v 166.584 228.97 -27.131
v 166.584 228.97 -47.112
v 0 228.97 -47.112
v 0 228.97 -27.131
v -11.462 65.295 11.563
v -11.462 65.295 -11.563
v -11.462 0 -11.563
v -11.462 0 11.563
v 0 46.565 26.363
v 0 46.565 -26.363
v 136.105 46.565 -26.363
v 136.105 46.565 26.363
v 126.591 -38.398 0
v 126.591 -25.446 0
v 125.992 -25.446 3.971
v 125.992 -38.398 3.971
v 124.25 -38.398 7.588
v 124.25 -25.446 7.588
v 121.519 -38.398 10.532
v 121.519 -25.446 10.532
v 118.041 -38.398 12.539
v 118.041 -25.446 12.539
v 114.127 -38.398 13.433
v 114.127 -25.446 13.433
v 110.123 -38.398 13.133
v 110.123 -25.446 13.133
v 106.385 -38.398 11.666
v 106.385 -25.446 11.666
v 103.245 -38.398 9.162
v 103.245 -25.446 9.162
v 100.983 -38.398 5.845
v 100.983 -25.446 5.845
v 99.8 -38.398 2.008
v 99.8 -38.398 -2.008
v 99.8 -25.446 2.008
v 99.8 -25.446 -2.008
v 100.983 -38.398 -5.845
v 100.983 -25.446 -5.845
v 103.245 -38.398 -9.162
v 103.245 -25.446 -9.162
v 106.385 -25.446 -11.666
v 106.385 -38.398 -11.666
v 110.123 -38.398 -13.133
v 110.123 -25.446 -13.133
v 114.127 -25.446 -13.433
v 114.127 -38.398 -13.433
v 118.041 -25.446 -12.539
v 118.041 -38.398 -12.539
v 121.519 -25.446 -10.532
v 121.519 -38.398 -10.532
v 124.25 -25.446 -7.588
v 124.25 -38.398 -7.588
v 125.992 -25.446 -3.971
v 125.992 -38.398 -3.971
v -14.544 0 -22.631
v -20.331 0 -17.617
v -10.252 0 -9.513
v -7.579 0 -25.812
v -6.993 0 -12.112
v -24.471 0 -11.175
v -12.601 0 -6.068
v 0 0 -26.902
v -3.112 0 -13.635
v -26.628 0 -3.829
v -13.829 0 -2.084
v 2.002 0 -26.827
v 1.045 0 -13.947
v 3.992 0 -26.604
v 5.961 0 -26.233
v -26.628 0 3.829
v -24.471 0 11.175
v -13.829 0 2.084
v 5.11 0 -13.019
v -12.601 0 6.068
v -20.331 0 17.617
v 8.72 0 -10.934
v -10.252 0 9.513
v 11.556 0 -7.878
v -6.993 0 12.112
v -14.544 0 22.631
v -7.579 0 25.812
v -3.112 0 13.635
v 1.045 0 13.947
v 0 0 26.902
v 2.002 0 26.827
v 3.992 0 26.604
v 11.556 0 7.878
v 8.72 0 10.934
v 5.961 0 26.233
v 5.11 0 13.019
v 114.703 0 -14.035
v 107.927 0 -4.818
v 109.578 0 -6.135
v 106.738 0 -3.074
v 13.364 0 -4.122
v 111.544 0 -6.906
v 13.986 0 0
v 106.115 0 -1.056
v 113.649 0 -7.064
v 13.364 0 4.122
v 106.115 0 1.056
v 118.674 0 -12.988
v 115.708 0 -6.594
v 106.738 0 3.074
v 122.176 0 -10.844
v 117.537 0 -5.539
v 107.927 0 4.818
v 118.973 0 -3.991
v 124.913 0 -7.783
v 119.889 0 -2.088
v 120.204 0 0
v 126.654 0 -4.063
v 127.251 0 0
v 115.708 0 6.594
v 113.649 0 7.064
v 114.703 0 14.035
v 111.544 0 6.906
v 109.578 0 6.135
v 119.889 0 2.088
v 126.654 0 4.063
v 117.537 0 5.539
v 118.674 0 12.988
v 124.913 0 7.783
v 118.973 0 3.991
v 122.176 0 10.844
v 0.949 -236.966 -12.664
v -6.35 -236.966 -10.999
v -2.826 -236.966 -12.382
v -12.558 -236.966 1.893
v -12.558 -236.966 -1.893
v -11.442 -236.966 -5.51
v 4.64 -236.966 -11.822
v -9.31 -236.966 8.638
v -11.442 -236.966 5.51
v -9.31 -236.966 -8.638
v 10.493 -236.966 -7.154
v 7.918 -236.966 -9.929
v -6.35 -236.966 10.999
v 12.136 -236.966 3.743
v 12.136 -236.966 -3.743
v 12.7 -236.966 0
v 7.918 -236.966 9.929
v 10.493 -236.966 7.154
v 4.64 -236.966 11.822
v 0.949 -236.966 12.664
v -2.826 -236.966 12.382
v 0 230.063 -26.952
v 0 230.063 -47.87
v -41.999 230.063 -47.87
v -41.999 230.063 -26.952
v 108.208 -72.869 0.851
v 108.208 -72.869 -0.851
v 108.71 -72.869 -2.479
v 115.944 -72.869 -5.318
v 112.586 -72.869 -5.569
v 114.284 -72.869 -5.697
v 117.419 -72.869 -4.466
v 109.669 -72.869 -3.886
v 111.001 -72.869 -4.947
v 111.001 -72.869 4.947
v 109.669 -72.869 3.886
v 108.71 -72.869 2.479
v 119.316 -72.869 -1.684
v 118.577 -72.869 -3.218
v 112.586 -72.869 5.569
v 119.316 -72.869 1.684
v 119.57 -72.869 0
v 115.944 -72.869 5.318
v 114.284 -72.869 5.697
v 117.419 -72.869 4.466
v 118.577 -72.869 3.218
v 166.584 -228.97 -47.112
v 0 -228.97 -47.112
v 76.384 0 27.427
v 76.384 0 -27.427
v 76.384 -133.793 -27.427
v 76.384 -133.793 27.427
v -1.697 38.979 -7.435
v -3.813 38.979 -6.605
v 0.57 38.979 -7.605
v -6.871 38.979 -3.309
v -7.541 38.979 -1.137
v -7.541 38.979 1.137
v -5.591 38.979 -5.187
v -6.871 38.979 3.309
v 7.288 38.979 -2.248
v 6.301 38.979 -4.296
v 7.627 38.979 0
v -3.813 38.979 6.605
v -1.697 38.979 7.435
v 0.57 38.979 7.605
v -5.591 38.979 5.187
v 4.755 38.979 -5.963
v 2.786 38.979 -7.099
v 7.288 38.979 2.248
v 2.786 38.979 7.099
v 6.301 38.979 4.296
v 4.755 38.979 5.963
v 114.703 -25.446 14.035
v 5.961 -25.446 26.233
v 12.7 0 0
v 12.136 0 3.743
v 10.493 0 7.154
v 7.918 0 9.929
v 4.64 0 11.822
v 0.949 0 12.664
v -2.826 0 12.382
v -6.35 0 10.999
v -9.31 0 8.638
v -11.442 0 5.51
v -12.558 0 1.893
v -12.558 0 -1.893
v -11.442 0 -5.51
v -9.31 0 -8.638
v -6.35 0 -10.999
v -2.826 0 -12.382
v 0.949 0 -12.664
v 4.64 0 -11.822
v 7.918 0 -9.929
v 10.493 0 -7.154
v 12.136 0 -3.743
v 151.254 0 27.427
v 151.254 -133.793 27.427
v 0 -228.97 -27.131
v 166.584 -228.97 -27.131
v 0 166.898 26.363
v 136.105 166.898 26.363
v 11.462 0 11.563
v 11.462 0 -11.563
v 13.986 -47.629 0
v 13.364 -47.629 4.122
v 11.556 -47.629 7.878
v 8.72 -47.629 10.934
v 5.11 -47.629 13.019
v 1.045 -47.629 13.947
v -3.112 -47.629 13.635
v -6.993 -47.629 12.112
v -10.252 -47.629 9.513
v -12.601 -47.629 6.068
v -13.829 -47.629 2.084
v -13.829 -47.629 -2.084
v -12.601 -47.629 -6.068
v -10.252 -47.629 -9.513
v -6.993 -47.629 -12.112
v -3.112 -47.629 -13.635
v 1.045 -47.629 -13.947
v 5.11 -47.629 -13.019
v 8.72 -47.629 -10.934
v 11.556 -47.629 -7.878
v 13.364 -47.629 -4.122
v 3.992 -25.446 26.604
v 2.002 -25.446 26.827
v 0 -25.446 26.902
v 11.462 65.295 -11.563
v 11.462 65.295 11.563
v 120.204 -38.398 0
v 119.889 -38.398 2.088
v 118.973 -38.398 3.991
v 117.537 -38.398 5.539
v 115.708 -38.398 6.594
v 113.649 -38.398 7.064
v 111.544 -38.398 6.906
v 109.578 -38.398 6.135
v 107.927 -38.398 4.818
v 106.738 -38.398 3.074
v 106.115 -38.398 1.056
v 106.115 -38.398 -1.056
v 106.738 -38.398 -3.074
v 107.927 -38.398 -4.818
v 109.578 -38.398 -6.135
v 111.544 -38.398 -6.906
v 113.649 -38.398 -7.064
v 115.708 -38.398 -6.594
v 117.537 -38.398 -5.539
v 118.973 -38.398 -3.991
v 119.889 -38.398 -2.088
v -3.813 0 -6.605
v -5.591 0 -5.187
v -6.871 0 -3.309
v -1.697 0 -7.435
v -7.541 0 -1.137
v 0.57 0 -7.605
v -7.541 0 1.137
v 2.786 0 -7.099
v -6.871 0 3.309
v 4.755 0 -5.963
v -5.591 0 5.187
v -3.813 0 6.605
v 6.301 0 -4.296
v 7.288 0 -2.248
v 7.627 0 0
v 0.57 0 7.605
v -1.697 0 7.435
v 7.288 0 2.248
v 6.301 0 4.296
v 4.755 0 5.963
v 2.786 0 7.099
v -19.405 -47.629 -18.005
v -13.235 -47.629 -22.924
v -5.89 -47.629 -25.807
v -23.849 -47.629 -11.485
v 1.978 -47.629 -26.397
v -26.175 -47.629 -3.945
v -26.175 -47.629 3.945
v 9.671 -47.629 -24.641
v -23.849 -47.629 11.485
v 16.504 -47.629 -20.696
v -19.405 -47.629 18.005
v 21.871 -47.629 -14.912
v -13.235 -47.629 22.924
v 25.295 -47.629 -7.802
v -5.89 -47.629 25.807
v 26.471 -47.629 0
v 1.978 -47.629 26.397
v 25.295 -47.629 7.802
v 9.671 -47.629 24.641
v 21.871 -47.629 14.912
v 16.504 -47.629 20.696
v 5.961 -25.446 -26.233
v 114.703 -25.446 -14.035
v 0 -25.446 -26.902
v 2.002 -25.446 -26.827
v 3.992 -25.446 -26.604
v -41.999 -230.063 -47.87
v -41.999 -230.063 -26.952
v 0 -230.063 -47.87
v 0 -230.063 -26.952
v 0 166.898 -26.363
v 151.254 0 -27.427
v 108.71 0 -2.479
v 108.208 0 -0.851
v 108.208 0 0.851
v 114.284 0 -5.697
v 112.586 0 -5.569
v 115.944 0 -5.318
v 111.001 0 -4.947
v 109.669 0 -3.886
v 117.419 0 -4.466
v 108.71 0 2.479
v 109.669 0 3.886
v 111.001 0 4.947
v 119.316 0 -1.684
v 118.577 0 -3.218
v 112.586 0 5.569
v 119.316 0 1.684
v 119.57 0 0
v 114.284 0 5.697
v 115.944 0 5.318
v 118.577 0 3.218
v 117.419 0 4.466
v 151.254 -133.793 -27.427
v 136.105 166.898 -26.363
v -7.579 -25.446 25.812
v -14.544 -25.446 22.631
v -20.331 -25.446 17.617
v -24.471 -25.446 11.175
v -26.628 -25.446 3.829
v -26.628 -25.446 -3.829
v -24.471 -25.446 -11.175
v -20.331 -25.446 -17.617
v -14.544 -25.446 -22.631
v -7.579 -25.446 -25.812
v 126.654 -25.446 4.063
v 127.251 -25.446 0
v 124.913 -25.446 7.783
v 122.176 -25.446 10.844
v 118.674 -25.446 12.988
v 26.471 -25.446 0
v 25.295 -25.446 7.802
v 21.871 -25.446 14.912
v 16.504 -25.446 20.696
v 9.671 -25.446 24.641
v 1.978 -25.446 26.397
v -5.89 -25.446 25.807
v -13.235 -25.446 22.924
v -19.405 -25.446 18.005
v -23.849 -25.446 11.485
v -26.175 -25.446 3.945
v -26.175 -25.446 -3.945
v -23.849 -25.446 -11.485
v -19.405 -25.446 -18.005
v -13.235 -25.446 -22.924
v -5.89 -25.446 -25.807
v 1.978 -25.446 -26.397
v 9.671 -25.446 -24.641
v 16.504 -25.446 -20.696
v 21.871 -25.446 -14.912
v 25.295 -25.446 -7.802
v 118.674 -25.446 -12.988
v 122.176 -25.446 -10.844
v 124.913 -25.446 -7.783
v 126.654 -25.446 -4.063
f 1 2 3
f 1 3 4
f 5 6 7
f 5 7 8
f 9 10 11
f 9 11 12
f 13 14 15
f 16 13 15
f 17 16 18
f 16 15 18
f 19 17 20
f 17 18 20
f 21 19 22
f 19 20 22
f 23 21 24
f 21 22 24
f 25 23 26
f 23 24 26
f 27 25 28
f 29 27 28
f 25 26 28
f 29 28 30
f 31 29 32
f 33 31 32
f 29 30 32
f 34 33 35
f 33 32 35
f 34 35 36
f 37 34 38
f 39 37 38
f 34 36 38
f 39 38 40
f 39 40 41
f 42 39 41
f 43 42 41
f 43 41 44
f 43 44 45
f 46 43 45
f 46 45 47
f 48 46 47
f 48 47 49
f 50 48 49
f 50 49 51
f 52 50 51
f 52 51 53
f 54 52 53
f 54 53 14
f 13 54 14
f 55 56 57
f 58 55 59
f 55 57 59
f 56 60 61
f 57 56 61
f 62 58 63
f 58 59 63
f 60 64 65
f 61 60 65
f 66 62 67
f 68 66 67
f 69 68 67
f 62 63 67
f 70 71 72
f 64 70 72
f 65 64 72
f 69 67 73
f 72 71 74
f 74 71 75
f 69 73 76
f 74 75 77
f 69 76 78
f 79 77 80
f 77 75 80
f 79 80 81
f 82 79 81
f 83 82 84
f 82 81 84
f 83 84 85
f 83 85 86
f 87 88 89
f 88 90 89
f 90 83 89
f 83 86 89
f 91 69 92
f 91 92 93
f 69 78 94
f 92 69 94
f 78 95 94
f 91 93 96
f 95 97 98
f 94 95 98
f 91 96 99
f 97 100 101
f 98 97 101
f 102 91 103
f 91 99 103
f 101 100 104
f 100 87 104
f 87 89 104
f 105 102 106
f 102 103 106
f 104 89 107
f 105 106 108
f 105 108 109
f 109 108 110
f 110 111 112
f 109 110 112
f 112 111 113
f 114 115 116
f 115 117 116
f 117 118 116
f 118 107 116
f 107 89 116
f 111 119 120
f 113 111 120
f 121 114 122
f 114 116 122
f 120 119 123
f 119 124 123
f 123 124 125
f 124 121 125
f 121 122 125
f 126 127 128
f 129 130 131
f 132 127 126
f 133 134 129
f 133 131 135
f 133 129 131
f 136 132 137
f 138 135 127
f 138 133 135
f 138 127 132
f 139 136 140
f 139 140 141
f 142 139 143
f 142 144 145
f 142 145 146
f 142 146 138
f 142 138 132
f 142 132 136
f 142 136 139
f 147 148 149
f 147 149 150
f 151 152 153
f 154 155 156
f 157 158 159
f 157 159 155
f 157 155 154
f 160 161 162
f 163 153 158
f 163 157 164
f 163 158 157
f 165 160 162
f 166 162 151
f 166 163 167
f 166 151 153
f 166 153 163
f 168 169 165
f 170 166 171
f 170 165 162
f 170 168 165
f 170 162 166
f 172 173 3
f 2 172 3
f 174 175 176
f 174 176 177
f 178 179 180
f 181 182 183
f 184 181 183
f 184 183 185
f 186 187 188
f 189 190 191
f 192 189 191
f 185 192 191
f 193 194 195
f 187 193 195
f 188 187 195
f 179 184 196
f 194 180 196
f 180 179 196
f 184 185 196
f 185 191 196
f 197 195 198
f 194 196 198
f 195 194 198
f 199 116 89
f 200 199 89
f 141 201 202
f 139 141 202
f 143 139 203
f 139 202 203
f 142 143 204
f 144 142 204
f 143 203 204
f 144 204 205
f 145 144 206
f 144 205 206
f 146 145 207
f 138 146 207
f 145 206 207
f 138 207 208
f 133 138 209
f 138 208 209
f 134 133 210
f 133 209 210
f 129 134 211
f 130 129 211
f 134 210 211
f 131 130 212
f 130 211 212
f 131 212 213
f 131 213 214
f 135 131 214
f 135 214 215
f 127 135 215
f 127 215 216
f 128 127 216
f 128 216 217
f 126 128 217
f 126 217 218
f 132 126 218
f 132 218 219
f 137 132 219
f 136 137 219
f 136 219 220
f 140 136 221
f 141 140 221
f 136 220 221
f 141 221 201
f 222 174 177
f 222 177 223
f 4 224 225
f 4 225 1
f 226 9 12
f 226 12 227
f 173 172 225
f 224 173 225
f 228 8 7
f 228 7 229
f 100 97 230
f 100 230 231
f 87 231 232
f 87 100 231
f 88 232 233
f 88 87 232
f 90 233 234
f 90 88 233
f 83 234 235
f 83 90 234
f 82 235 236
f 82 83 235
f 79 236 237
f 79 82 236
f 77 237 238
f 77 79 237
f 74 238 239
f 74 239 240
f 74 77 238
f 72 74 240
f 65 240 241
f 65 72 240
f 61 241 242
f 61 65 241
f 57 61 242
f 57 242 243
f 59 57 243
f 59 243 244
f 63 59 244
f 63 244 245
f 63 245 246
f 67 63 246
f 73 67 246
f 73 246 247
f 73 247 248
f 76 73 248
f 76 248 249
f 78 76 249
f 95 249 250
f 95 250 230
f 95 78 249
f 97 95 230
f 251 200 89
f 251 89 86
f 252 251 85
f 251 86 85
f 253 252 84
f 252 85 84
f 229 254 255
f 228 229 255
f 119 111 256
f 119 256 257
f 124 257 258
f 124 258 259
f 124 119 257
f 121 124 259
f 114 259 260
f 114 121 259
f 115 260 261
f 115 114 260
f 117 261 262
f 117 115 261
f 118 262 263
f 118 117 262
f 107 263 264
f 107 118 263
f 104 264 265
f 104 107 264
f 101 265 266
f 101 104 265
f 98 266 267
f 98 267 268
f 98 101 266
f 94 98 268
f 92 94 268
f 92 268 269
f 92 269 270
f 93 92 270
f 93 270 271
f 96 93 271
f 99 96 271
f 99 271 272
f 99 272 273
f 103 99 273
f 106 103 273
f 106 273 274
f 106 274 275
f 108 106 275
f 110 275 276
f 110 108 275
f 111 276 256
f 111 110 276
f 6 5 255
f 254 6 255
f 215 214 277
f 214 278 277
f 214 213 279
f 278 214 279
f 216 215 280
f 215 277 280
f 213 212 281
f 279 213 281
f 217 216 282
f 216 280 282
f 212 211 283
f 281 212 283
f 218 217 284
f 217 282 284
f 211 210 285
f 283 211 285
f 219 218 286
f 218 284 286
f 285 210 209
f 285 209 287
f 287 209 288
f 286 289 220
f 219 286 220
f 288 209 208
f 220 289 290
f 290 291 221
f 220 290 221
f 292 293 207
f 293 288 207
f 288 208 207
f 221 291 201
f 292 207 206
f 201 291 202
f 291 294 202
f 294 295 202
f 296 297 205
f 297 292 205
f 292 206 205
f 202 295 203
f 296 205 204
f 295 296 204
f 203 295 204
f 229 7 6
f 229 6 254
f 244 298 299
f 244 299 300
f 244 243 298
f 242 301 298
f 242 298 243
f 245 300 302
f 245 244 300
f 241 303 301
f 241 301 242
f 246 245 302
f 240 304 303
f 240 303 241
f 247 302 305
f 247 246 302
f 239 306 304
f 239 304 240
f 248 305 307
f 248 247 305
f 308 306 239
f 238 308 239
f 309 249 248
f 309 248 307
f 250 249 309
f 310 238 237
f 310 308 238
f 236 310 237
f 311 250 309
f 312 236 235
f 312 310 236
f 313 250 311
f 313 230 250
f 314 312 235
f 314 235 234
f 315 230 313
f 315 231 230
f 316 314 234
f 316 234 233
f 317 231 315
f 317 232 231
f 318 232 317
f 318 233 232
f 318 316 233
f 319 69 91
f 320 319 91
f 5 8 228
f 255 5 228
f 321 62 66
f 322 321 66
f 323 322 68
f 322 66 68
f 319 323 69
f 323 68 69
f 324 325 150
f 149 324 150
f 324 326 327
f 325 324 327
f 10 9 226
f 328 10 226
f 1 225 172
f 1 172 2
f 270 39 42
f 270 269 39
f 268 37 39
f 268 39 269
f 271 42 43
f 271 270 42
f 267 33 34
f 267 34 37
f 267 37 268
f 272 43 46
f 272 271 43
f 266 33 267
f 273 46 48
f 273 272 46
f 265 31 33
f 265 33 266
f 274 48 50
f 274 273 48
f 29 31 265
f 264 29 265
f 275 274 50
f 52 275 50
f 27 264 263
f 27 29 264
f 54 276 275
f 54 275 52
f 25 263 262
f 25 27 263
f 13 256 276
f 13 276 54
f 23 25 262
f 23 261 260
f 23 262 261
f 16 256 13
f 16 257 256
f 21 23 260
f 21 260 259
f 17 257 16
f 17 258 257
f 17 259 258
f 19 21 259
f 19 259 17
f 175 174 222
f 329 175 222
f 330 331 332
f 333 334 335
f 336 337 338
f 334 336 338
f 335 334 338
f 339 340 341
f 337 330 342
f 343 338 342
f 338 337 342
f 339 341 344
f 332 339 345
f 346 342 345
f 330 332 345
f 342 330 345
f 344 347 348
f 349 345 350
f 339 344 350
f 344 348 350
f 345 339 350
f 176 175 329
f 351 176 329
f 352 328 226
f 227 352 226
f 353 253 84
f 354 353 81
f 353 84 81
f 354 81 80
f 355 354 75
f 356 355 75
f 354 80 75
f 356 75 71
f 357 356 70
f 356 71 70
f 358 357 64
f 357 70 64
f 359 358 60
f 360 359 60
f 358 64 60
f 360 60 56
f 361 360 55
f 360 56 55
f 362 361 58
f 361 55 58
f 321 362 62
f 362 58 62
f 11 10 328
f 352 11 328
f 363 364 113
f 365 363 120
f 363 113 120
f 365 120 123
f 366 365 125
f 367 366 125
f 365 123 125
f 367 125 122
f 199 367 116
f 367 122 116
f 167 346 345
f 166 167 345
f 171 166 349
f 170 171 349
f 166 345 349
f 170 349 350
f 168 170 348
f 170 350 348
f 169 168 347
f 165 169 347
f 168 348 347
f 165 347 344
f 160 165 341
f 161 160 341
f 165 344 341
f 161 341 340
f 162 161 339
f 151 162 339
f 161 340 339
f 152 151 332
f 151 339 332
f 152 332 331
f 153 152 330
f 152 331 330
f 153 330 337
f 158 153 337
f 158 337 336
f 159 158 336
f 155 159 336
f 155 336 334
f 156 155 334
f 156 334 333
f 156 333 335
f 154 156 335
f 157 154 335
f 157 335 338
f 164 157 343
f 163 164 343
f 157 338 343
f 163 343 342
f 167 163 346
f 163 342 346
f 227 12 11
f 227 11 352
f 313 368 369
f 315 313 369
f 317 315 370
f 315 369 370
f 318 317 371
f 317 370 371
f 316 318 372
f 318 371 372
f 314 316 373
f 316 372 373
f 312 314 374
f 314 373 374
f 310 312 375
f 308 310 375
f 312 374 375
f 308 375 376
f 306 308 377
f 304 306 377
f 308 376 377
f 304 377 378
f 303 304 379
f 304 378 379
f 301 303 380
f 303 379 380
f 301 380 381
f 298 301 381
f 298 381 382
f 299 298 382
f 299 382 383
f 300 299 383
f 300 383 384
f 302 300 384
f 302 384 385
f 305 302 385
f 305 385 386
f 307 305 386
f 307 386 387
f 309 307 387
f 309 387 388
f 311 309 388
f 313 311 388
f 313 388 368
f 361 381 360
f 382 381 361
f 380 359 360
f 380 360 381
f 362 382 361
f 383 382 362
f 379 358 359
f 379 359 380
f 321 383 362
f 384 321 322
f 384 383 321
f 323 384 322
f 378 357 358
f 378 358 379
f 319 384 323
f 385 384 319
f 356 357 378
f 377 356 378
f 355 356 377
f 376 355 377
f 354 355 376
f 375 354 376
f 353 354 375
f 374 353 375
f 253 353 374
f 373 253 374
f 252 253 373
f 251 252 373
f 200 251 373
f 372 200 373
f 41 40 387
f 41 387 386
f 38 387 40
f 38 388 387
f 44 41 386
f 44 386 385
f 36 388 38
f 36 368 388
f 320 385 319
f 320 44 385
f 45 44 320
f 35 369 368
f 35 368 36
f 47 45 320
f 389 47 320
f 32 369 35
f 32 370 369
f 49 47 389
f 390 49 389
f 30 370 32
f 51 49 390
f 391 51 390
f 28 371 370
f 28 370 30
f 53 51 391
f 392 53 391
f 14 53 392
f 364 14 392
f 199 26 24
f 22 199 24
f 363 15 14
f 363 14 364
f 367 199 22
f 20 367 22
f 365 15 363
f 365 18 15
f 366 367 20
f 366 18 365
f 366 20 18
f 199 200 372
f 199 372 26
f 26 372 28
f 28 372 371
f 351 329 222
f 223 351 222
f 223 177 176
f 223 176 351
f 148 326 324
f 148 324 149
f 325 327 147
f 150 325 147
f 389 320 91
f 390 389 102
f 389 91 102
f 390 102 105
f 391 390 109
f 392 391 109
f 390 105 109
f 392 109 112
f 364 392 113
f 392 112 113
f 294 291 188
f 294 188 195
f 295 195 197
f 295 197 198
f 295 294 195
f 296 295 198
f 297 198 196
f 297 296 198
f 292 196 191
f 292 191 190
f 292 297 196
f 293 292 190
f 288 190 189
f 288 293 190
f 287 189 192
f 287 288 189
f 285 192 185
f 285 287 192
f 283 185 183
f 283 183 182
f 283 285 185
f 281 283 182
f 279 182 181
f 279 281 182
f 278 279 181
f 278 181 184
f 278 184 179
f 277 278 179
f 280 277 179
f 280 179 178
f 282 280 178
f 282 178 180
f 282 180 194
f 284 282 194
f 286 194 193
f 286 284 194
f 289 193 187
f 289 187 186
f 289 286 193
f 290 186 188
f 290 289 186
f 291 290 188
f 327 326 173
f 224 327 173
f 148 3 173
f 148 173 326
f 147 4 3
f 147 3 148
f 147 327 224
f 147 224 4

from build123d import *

# Parameters (mm, degrees)
F0_R      = 14.3293647742
F0_R_2    = 8.090753617
F1_DEPTH  = 25.4459455609
F2_R      = 26.470860224
F2_R_2    = 13.9856812783
F3_DEPTH  = 47.6294439286
F4_R      = 13.4706024235
F4_R_2    = 7.084059424
F5_DEPTH  = 38.3975785226
F6_R      = 12.7
F7_DEPTH  = 236.9658201933
F8_R      = 7.6266251534
F9_DEPTH  = 38.9788094908
F10_W     = 457.9400420189
F10_H     = 19.9817121029
F11_DEPTH = 166.583776474
F14_W     = 120.3324198723
F14_H     = 52.7262985706
F15_DEPTH = 136.1045930535
F16_W     = 460.1263403893
F16_H     = 20.917981863
F17_DEPTH = 41.9985167682
F18_W     = 22.9237377644
F18_H     = 23.126155138
F19_DEPTH = 65.294874832
F22_R     = 5.7126926056
F23_DEPTH = 72.8688146919
F24_W     = 74.8696923256
F24_H     = 54.8530220985
F25_DEPTH = 133.7927896529


# Not quite as in the source:
# - the program builds the solid bodies; features that only make, move or delete a surface that nothing else refers to are left out


with BuildPart() as f1:
    # F0 (on Front) → F1 (new body)
    with BuildSketch(Plane.XZ):
        with BuildLine():
            Line((5.9606575044, 26.2333161817), (0, 26.901976057))
            ThreePointArc((0, 26.901976057), (-26.901976057, 0), (0, -26.901976057))
            Line((0, -26.901976057), (5.9606575044, -26.2333161817))
            ThreePointArc((5.9606575044, -26.2333161817), (21.024625814, -16.7833675153), (26.901976057, 0))
            ThreePointArc((26.901976057, 0), (21.024625814, 16.7833675153), (5.9606575044, 26.2333161817))
        make_face()
        Circle(F0_R, mode=Mode.SUBTRACT)
        with BuildLine():
            ThreePointArc((5.9606575044, 26.2333161817), (2.9990225038, 26.7342884662), (0, 26.901976057))
            Line((0, 26.901976057), (5.9606575044, 26.2333161817))
        make_face()
        with BuildLine():
            Line((5.9606575044, -26.2333161817), (0, -26.901976057))
            ThreePointArc((0, -26.901976057), (2.9990225038, -26.7342884662), (5.9606575044, -26.2333161817))
        make_face()
        with BuildLine():
            Line((114.7026486896, 14.0347615394), (5.9606575044, 26.2333161817))
            ThreePointArc((5.9606575044, 26.2333161817), (21.024625814, 16.7833675153), (26.901976057, 0))
            ThreePointArc((26.901976057, 0), (21.024625814, -16.7833675153), (5.9606575044, -26.2333161817))
            Line((5.9606575044, -26.2333161817), (114.7026486896, -14.0347615394))
            ThreePointArc((114.7026486896, -14.0347615394), (99.0054519932, 0), (114.7026486896, 14.0347615394))
        make_face()
        with BuildLine():
            ThreePointArc((127.2510377605, 0), (123.6564987159, 9.4132433271), (114.7026486896, 14.0347615394))
            ThreePointArc((114.7026486896, 14.0347615394), (99.0054519932, 0), (114.7026486896, -14.0347615394))
            ThreePointArc((114.7026486896, -14.0347615394), (123.6564987159, -9.4132433271), (127.2510377605, 0))
        make_face()
        with Locations((113.1282448769, 0)):
            Circle(F0_R_2, mode=Mode.SUBTRACT)
    extrude(amount=F1_DEPTH)

    # F2 (on Front) → F3 (join)
    with BuildSketch(Plane.XZ):
        Circle(F2_R)
        Circle(F2_R_2, mode=Mode.SUBTRACT)
    extrude(amount=F3_DEPTH)

    # F4 (on Front) → F5 (join)
    with BuildSketch(Plane.XZ):
        with Locations((113.1200492382, 0)):
            Circle(F4_R)
        with Locations((113.1200492382, 0)):
            Circle(F4_R_2, mode=Mode.SUBTRACT)
    extrude(amount=F5_DEPTH)


with BuildPart() as f7:
    # F6 (on Front) → F7 (new body)
    with BuildSketch(Plane.XZ):
        Circle(F6_R)
    extrude(amount=F7_DEPTH)

    # F8 (on Front) → F9 (join)
    with BuildSketch(Plane.XZ):
        Circle(F8_R)
    extrude(amount=-F9_DEPTH)


with BuildPart() as f11:
    # F10 (on Right) → F11 (new body)
    with BuildSketch(Plane.YZ):
        with Locations((0, -37.1216386557)):
            Rectangle(F10_W, F10_H)
    extrude(amount=F11_DEPTH)

    # F16 (on Right) → F17 (join)
    with BuildSketch(Plane.YZ):
        with Locations((0, -37.4110639095)):
            Rectangle(F16_W, F16_H)
    extrude(amount=-F17_DEPTH)


with BuildPart() as f15:
    # F14 (on Right) → F15 (new body)
    with BuildSketch(Plane.YZ):
        with Locations((106.7316830158, 0)):
            Rectangle(F14_W, F14_H)
    extrude(amount=F15_DEPTH)


with BuildPart() as f19:
    # F18 (on Front) → F19 (new body)
    with BuildSketch(Plane.XZ):
        Rectangle(F18_W, F18_H)
    extrude(amount=-F19_DEPTH)


with BuildPart() as f23:
    # F22 (on Front) → F23 (new body)
    with BuildSketch(Plane.XZ):
        with Locations((113.857075572, 0)):
            Circle(F22_R)
    extrude(amount=F23_DEPTH)


with BuildPart() as f25:
    # F24 (on Front) → F25 (new body)
    with BuildSketch(Plane.XZ):
        with Locations((113.8191521168, 0)):
            Rectangle(F24_W, F24_H)
    extrude(amount=F25_DEPTH)


solid = Compound([f1.part, f7.part, f11.part, f15.part, f19.part, f23.part, f25.part])
